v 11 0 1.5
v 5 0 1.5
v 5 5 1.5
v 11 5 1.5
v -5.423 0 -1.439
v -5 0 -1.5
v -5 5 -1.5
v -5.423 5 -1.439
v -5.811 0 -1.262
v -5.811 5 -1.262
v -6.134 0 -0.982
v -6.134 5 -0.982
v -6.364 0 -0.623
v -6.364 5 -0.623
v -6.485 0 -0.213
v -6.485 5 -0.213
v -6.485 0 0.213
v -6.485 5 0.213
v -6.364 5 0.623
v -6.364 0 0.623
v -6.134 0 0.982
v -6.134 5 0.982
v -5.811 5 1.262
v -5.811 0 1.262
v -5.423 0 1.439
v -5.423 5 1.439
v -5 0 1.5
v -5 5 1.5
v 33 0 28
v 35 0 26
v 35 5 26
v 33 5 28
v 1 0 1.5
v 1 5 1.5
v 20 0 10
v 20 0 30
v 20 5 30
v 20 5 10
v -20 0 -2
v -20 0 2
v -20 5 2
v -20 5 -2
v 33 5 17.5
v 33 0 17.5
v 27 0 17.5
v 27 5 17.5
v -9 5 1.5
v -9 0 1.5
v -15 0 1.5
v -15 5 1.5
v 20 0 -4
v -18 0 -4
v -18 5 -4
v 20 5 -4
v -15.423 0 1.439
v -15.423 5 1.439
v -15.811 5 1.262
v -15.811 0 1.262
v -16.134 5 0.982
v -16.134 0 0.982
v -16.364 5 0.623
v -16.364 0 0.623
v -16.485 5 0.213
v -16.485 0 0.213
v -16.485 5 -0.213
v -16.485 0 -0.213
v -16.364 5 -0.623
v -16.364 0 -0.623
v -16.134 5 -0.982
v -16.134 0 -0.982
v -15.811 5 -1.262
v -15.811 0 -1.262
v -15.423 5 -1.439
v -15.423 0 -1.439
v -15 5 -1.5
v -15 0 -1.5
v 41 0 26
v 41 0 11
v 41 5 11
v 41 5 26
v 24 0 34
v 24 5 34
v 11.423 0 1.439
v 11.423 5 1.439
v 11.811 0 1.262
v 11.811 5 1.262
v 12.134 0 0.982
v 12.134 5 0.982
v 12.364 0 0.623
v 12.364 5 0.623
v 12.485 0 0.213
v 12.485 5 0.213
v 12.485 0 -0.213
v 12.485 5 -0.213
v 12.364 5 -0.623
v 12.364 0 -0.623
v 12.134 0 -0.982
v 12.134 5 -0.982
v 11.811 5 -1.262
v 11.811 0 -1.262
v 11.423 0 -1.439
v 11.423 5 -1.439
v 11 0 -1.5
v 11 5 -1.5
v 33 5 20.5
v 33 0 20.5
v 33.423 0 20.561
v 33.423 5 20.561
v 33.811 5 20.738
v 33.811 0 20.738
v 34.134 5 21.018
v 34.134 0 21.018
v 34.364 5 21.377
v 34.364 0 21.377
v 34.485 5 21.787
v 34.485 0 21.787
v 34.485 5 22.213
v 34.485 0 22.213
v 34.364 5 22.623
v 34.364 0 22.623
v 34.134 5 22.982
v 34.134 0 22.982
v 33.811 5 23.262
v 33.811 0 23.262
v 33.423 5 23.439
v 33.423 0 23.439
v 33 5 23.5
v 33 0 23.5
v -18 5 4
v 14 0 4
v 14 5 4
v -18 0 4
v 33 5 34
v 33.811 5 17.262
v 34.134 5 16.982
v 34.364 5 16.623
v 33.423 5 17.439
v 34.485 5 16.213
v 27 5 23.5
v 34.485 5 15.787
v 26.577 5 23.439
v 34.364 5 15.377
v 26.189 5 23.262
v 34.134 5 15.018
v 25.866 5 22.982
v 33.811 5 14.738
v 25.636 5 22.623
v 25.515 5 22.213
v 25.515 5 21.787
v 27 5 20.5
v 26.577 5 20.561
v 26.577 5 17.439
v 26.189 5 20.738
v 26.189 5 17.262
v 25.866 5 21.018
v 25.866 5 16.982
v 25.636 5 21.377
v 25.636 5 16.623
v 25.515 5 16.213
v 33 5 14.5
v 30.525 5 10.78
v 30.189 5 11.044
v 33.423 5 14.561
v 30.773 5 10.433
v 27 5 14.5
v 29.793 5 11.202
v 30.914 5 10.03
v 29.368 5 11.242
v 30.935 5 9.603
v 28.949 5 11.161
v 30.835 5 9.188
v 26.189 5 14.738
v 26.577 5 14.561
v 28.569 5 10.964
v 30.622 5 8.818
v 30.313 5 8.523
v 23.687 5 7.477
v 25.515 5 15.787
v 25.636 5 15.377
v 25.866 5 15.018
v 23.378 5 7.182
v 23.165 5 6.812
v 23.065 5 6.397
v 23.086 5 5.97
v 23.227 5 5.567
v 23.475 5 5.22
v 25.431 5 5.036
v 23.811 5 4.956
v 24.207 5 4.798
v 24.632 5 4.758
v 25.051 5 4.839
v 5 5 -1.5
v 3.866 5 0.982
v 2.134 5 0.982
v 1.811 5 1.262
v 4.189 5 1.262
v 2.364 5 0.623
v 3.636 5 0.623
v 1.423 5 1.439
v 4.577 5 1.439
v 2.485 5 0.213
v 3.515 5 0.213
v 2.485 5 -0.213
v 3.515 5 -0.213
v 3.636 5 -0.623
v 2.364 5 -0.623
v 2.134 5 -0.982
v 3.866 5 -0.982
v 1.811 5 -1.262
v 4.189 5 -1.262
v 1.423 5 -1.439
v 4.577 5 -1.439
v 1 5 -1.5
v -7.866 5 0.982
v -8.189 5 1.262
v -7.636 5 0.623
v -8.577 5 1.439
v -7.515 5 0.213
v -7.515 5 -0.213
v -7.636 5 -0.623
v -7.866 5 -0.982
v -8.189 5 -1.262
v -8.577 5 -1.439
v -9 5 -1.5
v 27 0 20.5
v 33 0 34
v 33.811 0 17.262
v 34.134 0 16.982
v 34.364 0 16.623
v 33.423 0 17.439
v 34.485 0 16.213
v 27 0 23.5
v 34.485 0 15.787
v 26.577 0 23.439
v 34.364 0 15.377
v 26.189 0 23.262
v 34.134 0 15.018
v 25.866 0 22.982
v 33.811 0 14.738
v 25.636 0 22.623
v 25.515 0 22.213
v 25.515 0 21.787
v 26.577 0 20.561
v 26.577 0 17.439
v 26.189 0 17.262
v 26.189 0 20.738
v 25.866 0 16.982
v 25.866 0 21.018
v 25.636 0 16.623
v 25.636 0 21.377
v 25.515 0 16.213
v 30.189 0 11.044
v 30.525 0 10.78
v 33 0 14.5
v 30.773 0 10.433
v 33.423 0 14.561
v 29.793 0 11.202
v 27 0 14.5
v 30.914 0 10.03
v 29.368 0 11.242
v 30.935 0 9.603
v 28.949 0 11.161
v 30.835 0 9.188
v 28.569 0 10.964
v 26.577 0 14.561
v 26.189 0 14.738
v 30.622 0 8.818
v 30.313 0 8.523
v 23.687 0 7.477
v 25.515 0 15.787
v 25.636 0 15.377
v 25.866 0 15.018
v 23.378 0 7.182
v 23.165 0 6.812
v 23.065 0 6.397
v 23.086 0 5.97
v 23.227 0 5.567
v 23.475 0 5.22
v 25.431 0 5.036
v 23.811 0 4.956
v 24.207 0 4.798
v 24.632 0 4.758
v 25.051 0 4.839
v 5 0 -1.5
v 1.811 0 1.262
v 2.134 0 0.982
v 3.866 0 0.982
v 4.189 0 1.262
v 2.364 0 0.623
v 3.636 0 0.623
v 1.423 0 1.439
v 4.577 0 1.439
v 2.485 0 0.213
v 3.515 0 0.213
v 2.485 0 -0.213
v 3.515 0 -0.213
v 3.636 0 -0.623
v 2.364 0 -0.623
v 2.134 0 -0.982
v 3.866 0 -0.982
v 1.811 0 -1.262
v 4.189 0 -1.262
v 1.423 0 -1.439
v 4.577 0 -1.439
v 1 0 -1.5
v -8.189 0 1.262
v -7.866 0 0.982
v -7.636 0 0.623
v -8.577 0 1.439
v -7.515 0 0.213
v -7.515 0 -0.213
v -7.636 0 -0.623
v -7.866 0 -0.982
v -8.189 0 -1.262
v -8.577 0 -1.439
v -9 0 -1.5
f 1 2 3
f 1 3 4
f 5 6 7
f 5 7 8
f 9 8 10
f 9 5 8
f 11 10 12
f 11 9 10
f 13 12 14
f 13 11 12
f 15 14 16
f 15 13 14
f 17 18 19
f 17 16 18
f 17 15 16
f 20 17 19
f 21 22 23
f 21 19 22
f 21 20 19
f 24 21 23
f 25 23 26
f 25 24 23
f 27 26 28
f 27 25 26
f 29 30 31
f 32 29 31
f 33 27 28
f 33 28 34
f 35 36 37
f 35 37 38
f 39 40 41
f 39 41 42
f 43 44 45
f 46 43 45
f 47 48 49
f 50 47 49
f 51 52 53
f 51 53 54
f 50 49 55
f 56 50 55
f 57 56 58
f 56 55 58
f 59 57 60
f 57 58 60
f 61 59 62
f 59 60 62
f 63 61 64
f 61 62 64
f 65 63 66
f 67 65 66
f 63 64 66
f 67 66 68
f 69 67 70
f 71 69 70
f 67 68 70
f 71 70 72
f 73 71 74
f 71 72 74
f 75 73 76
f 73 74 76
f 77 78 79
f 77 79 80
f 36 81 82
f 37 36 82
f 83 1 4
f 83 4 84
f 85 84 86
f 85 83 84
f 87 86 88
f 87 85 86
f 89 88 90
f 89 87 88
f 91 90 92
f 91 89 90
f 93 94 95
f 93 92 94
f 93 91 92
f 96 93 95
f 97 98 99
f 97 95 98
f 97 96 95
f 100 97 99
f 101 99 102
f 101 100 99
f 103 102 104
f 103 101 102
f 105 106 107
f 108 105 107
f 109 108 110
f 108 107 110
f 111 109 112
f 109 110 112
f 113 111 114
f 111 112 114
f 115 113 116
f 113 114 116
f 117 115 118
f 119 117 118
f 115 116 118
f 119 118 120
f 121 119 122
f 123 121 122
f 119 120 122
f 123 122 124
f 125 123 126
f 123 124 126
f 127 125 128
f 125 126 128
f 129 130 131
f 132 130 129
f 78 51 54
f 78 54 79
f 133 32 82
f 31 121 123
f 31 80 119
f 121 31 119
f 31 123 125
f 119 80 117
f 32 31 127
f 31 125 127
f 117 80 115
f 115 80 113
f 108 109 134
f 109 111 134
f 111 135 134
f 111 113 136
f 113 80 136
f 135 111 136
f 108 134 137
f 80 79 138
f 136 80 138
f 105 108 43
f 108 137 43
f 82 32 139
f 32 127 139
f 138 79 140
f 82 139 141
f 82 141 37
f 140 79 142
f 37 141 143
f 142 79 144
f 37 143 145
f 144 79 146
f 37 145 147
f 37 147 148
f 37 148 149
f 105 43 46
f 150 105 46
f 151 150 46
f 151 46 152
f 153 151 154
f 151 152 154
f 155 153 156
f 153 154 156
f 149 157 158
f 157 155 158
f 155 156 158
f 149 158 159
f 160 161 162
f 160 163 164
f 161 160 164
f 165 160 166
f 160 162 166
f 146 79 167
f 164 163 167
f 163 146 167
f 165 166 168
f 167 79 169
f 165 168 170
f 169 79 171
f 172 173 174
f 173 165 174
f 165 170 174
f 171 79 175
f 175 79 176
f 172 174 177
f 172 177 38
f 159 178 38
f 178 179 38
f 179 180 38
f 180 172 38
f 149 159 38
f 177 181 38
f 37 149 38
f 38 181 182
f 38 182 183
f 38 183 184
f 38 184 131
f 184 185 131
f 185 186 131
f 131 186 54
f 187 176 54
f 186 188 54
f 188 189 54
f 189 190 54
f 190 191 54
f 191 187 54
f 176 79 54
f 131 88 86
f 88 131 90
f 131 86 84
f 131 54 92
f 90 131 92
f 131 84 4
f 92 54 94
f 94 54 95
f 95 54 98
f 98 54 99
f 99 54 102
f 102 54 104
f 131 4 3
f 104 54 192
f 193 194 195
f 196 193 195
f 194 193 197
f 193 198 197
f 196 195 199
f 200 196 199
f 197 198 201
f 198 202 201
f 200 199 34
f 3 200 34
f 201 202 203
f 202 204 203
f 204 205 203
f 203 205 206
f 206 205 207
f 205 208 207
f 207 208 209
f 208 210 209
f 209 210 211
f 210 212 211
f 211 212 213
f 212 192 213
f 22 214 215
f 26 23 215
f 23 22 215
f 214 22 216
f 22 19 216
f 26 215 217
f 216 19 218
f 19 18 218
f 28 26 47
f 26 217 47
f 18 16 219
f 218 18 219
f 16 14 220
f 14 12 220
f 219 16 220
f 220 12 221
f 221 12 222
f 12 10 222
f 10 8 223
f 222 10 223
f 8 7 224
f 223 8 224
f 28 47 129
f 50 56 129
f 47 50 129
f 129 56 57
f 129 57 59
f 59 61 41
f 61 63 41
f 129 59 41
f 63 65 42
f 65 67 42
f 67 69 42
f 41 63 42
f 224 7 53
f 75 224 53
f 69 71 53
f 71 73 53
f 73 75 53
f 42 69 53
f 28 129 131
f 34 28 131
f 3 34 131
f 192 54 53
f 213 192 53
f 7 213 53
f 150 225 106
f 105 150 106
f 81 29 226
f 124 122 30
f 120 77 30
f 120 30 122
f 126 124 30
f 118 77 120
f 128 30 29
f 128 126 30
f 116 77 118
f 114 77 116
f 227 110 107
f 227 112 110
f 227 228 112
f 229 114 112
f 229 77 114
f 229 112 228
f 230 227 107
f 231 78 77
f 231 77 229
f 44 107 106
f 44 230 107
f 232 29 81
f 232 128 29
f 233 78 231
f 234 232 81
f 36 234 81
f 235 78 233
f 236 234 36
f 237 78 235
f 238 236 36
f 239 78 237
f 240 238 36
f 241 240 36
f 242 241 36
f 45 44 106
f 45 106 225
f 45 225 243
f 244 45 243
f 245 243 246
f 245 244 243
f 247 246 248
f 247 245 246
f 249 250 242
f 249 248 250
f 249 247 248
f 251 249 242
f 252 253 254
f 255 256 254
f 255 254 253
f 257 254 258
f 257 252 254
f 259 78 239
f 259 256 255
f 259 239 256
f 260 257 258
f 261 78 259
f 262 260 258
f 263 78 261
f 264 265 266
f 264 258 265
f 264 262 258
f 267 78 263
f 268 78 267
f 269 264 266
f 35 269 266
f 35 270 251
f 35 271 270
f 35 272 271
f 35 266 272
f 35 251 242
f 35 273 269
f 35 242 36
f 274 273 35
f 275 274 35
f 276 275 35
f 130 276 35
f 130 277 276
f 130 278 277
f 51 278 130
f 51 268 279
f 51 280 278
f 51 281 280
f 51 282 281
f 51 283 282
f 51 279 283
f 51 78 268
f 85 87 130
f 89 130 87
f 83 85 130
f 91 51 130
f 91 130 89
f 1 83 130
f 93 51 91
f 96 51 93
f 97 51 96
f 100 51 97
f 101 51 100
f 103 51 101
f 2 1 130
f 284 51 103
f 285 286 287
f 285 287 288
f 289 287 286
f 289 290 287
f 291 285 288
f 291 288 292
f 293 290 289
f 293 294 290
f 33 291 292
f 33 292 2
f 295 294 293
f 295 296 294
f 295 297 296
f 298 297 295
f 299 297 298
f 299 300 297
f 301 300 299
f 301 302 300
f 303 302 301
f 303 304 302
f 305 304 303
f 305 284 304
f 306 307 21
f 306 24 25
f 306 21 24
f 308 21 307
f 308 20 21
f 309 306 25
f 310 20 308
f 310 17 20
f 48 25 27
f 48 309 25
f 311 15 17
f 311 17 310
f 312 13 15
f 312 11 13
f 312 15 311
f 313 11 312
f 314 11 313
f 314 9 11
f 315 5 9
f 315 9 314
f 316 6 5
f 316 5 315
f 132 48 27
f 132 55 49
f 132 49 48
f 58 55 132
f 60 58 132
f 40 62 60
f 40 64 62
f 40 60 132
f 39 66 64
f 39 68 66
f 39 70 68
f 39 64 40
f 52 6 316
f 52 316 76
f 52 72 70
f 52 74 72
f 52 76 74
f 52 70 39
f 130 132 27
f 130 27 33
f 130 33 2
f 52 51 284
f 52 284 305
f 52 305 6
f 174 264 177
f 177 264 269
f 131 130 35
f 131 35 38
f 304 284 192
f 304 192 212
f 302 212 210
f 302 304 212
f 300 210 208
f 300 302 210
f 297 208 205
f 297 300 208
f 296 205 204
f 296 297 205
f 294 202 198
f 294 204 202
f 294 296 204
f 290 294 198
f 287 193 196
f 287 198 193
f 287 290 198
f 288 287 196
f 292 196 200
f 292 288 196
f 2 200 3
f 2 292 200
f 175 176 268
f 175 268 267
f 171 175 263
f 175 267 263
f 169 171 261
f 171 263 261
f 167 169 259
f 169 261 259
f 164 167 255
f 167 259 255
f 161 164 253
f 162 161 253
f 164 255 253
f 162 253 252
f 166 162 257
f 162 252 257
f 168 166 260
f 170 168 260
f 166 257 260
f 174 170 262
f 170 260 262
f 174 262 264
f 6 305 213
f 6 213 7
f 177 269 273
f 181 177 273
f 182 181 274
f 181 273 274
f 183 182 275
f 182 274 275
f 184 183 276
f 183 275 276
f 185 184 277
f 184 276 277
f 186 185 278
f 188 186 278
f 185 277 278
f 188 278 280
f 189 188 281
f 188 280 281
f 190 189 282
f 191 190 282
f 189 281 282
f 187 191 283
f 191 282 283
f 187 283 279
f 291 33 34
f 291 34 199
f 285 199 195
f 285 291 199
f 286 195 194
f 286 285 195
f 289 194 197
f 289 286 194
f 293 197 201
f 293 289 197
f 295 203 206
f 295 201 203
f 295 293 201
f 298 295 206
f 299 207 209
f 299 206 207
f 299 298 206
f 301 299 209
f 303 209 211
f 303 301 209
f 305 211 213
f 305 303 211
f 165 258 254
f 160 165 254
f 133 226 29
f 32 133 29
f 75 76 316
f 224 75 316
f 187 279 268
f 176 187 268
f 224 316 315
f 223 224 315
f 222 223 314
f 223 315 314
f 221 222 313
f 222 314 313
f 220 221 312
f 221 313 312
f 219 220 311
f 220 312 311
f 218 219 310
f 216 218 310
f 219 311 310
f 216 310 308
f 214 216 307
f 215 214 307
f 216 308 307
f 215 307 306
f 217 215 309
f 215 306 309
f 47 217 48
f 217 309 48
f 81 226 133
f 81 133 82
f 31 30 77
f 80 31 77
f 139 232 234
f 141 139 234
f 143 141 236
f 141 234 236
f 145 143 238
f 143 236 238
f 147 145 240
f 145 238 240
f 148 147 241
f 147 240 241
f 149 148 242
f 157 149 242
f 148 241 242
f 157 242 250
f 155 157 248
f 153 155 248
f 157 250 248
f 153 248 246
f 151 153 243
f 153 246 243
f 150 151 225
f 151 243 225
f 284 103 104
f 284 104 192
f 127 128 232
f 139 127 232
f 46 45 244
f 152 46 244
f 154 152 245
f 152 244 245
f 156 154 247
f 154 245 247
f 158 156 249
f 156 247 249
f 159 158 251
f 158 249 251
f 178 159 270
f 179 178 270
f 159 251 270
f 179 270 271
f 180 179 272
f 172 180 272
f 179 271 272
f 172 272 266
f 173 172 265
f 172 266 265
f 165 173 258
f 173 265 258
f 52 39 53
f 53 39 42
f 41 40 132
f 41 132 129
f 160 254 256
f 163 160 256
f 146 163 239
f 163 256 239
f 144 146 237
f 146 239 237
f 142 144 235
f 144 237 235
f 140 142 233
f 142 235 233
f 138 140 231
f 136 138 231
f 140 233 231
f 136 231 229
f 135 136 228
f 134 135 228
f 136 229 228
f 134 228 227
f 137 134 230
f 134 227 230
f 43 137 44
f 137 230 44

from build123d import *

# Parameters (mm, degrees)
EXTRUDE_1_DEPTH          = 5
CHAMFER_1_SIZE           = 6
CUT_EXTRUDE_1_DEPTH      = 54.4976635
CUT_EXTRUDE_1_DEPTH_BACK = 54.4976635
SKETCH_3_W               = 8
SKETCH_3_H               = 8
CHAMFER_2_SIZE           = 2
CHAMFER_3_SIZE           = 2
CHAMFER_4_SIZE           = 4


with BuildPart() as part:
    # 草图1 → 凸台-拉伸1 (new body)
    with BuildSketch(Plane(origin=(0, 0, 0), x_dir=(1, 0, 0), z_dir=(0, 1, 0))):
        Polygon((20, 4), (41, -11), (41, -34), (20, -34), (20, -4), (-20, -4), (-20, 4), align=None)
    extrude(amount=EXTRUDE_1_DEPTH)

    # 倒角1
    chamfer_1_edges = [part.edges().sort_by_distance(p)[0] for p in [
        (20, 2.5, 4),
    ]]
    chamfer(chamfer_1_edges, length=CHAMFER_1_SIZE)

    # 草图3 → 切除-拉伸1 (cut, two sides: drawn at the far end of the back side and taken through both)
    with BuildSketch(Plane(origin=(0, 5, 0), x_dir=(1, 0, 0), z_dir=(0, 1, 0)).offset(-CUT_EXTRUDE_1_DEPTH_BACK)):
        with BuildLine():
            Line((-15, 1.5), (-9, 1.5))
            ThreePointArc((-9, 1.5), (-7.5, 0), (-9, -1.5))
            Line((-9, -1.5), (-15, -1.5))
            ThreePointArc((-15, -1.5), (-16.5, 0), (-15, 1.5))
        make_face()
        with BuildLine():
            Line((-5, -1.5), (1, -1.5))
            ThreePointArc((1, -1.5), (2.5, 0), (1, 1.5))
            Line((1, 1.5), (-5, 1.5))
            ThreePointArc((-5, 1.5), (-6.5, 0), (-5, -1.5))
        make_face()
        with BuildLine():
            Line((5, -1.5), (11, -1.5))
            ThreePointArc((11, -1.5), (12.5, 0), (11, 1.5))
            Line((11, 1.5), (5, 1.5))
            ThreePointArc((5, 1.5), (3.5, 0), (5, -1.5))
        make_face()
        with BuildLine():
            Line((28.569343123, -10.964314788), (23.686942296, -7.476885626))
            ThreePointArc((23.686942296, -7.476885626), (23.33819938, -5.384428128), (25.430656877, -5.035685212))
            Line((25.430656877, -5.035685212), (30.313057704, -8.523114374))
            ThreePointArc((30.313057704, -8.523114374), (30.66180062, -10.615571872), (28.569343123, -10.964314788))
        make_face()
        with BuildLine():
            Line((27, -14.5), (33, -14.5))
            ThreePointArc((33, -14.5), (34.5, -16), (33, -17.5))
            Line((33, -17.5), (27, -17.5))
            ThreePointArc((27, -17.5), (25.5, -16), (27, -14.5))
        make_face()
        with Locations((37, -30)):
            Rectangle(SKETCH_3_W, SKETCH_3_H)
        with BuildLine():
            Line((27, -20.5), (33, -20.5))
            ThreePointArc((33, -20.5), (34.5, -22), (33, -23.5))
            Line((33, -23.5), (27, -23.5))
            ThreePointArc((27, -23.5), (25.5, -22), (27, -20.5))
        make_face()
    extrude(amount=CUT_EXTRUDE_1_DEPTH + CUT_EXTRUDE_1_DEPTH_BACK, mode=Mode.SUBTRACT)

    # 倒角2
    chamfer_2_edges = [part.edges().sort_by_distance(p)[0] for p in [
        (33, 2.5, 26),
    ]]
    chamfer(chamfer_2_edges, length=CHAMFER_2_SIZE)

    # 倒角3
    chamfer_3_edges = [part.edges().sort_by_distance(p)[0] for p in [
        (-20, 2.5, 4),
        (-20, 2.5, -4),
    ]]
    chamfer(chamfer_3_edges, length=CHAMFER_3_SIZE)

    # 倒角4
    chamfer_4_edges = [part.edges().sort_by_distance(p)[0] for p in [
        (20, 2.5, 34),
    ]]
    chamfer(chamfer_4_edges, length=CHAMFER_4_SIZE)


solid = part.part
